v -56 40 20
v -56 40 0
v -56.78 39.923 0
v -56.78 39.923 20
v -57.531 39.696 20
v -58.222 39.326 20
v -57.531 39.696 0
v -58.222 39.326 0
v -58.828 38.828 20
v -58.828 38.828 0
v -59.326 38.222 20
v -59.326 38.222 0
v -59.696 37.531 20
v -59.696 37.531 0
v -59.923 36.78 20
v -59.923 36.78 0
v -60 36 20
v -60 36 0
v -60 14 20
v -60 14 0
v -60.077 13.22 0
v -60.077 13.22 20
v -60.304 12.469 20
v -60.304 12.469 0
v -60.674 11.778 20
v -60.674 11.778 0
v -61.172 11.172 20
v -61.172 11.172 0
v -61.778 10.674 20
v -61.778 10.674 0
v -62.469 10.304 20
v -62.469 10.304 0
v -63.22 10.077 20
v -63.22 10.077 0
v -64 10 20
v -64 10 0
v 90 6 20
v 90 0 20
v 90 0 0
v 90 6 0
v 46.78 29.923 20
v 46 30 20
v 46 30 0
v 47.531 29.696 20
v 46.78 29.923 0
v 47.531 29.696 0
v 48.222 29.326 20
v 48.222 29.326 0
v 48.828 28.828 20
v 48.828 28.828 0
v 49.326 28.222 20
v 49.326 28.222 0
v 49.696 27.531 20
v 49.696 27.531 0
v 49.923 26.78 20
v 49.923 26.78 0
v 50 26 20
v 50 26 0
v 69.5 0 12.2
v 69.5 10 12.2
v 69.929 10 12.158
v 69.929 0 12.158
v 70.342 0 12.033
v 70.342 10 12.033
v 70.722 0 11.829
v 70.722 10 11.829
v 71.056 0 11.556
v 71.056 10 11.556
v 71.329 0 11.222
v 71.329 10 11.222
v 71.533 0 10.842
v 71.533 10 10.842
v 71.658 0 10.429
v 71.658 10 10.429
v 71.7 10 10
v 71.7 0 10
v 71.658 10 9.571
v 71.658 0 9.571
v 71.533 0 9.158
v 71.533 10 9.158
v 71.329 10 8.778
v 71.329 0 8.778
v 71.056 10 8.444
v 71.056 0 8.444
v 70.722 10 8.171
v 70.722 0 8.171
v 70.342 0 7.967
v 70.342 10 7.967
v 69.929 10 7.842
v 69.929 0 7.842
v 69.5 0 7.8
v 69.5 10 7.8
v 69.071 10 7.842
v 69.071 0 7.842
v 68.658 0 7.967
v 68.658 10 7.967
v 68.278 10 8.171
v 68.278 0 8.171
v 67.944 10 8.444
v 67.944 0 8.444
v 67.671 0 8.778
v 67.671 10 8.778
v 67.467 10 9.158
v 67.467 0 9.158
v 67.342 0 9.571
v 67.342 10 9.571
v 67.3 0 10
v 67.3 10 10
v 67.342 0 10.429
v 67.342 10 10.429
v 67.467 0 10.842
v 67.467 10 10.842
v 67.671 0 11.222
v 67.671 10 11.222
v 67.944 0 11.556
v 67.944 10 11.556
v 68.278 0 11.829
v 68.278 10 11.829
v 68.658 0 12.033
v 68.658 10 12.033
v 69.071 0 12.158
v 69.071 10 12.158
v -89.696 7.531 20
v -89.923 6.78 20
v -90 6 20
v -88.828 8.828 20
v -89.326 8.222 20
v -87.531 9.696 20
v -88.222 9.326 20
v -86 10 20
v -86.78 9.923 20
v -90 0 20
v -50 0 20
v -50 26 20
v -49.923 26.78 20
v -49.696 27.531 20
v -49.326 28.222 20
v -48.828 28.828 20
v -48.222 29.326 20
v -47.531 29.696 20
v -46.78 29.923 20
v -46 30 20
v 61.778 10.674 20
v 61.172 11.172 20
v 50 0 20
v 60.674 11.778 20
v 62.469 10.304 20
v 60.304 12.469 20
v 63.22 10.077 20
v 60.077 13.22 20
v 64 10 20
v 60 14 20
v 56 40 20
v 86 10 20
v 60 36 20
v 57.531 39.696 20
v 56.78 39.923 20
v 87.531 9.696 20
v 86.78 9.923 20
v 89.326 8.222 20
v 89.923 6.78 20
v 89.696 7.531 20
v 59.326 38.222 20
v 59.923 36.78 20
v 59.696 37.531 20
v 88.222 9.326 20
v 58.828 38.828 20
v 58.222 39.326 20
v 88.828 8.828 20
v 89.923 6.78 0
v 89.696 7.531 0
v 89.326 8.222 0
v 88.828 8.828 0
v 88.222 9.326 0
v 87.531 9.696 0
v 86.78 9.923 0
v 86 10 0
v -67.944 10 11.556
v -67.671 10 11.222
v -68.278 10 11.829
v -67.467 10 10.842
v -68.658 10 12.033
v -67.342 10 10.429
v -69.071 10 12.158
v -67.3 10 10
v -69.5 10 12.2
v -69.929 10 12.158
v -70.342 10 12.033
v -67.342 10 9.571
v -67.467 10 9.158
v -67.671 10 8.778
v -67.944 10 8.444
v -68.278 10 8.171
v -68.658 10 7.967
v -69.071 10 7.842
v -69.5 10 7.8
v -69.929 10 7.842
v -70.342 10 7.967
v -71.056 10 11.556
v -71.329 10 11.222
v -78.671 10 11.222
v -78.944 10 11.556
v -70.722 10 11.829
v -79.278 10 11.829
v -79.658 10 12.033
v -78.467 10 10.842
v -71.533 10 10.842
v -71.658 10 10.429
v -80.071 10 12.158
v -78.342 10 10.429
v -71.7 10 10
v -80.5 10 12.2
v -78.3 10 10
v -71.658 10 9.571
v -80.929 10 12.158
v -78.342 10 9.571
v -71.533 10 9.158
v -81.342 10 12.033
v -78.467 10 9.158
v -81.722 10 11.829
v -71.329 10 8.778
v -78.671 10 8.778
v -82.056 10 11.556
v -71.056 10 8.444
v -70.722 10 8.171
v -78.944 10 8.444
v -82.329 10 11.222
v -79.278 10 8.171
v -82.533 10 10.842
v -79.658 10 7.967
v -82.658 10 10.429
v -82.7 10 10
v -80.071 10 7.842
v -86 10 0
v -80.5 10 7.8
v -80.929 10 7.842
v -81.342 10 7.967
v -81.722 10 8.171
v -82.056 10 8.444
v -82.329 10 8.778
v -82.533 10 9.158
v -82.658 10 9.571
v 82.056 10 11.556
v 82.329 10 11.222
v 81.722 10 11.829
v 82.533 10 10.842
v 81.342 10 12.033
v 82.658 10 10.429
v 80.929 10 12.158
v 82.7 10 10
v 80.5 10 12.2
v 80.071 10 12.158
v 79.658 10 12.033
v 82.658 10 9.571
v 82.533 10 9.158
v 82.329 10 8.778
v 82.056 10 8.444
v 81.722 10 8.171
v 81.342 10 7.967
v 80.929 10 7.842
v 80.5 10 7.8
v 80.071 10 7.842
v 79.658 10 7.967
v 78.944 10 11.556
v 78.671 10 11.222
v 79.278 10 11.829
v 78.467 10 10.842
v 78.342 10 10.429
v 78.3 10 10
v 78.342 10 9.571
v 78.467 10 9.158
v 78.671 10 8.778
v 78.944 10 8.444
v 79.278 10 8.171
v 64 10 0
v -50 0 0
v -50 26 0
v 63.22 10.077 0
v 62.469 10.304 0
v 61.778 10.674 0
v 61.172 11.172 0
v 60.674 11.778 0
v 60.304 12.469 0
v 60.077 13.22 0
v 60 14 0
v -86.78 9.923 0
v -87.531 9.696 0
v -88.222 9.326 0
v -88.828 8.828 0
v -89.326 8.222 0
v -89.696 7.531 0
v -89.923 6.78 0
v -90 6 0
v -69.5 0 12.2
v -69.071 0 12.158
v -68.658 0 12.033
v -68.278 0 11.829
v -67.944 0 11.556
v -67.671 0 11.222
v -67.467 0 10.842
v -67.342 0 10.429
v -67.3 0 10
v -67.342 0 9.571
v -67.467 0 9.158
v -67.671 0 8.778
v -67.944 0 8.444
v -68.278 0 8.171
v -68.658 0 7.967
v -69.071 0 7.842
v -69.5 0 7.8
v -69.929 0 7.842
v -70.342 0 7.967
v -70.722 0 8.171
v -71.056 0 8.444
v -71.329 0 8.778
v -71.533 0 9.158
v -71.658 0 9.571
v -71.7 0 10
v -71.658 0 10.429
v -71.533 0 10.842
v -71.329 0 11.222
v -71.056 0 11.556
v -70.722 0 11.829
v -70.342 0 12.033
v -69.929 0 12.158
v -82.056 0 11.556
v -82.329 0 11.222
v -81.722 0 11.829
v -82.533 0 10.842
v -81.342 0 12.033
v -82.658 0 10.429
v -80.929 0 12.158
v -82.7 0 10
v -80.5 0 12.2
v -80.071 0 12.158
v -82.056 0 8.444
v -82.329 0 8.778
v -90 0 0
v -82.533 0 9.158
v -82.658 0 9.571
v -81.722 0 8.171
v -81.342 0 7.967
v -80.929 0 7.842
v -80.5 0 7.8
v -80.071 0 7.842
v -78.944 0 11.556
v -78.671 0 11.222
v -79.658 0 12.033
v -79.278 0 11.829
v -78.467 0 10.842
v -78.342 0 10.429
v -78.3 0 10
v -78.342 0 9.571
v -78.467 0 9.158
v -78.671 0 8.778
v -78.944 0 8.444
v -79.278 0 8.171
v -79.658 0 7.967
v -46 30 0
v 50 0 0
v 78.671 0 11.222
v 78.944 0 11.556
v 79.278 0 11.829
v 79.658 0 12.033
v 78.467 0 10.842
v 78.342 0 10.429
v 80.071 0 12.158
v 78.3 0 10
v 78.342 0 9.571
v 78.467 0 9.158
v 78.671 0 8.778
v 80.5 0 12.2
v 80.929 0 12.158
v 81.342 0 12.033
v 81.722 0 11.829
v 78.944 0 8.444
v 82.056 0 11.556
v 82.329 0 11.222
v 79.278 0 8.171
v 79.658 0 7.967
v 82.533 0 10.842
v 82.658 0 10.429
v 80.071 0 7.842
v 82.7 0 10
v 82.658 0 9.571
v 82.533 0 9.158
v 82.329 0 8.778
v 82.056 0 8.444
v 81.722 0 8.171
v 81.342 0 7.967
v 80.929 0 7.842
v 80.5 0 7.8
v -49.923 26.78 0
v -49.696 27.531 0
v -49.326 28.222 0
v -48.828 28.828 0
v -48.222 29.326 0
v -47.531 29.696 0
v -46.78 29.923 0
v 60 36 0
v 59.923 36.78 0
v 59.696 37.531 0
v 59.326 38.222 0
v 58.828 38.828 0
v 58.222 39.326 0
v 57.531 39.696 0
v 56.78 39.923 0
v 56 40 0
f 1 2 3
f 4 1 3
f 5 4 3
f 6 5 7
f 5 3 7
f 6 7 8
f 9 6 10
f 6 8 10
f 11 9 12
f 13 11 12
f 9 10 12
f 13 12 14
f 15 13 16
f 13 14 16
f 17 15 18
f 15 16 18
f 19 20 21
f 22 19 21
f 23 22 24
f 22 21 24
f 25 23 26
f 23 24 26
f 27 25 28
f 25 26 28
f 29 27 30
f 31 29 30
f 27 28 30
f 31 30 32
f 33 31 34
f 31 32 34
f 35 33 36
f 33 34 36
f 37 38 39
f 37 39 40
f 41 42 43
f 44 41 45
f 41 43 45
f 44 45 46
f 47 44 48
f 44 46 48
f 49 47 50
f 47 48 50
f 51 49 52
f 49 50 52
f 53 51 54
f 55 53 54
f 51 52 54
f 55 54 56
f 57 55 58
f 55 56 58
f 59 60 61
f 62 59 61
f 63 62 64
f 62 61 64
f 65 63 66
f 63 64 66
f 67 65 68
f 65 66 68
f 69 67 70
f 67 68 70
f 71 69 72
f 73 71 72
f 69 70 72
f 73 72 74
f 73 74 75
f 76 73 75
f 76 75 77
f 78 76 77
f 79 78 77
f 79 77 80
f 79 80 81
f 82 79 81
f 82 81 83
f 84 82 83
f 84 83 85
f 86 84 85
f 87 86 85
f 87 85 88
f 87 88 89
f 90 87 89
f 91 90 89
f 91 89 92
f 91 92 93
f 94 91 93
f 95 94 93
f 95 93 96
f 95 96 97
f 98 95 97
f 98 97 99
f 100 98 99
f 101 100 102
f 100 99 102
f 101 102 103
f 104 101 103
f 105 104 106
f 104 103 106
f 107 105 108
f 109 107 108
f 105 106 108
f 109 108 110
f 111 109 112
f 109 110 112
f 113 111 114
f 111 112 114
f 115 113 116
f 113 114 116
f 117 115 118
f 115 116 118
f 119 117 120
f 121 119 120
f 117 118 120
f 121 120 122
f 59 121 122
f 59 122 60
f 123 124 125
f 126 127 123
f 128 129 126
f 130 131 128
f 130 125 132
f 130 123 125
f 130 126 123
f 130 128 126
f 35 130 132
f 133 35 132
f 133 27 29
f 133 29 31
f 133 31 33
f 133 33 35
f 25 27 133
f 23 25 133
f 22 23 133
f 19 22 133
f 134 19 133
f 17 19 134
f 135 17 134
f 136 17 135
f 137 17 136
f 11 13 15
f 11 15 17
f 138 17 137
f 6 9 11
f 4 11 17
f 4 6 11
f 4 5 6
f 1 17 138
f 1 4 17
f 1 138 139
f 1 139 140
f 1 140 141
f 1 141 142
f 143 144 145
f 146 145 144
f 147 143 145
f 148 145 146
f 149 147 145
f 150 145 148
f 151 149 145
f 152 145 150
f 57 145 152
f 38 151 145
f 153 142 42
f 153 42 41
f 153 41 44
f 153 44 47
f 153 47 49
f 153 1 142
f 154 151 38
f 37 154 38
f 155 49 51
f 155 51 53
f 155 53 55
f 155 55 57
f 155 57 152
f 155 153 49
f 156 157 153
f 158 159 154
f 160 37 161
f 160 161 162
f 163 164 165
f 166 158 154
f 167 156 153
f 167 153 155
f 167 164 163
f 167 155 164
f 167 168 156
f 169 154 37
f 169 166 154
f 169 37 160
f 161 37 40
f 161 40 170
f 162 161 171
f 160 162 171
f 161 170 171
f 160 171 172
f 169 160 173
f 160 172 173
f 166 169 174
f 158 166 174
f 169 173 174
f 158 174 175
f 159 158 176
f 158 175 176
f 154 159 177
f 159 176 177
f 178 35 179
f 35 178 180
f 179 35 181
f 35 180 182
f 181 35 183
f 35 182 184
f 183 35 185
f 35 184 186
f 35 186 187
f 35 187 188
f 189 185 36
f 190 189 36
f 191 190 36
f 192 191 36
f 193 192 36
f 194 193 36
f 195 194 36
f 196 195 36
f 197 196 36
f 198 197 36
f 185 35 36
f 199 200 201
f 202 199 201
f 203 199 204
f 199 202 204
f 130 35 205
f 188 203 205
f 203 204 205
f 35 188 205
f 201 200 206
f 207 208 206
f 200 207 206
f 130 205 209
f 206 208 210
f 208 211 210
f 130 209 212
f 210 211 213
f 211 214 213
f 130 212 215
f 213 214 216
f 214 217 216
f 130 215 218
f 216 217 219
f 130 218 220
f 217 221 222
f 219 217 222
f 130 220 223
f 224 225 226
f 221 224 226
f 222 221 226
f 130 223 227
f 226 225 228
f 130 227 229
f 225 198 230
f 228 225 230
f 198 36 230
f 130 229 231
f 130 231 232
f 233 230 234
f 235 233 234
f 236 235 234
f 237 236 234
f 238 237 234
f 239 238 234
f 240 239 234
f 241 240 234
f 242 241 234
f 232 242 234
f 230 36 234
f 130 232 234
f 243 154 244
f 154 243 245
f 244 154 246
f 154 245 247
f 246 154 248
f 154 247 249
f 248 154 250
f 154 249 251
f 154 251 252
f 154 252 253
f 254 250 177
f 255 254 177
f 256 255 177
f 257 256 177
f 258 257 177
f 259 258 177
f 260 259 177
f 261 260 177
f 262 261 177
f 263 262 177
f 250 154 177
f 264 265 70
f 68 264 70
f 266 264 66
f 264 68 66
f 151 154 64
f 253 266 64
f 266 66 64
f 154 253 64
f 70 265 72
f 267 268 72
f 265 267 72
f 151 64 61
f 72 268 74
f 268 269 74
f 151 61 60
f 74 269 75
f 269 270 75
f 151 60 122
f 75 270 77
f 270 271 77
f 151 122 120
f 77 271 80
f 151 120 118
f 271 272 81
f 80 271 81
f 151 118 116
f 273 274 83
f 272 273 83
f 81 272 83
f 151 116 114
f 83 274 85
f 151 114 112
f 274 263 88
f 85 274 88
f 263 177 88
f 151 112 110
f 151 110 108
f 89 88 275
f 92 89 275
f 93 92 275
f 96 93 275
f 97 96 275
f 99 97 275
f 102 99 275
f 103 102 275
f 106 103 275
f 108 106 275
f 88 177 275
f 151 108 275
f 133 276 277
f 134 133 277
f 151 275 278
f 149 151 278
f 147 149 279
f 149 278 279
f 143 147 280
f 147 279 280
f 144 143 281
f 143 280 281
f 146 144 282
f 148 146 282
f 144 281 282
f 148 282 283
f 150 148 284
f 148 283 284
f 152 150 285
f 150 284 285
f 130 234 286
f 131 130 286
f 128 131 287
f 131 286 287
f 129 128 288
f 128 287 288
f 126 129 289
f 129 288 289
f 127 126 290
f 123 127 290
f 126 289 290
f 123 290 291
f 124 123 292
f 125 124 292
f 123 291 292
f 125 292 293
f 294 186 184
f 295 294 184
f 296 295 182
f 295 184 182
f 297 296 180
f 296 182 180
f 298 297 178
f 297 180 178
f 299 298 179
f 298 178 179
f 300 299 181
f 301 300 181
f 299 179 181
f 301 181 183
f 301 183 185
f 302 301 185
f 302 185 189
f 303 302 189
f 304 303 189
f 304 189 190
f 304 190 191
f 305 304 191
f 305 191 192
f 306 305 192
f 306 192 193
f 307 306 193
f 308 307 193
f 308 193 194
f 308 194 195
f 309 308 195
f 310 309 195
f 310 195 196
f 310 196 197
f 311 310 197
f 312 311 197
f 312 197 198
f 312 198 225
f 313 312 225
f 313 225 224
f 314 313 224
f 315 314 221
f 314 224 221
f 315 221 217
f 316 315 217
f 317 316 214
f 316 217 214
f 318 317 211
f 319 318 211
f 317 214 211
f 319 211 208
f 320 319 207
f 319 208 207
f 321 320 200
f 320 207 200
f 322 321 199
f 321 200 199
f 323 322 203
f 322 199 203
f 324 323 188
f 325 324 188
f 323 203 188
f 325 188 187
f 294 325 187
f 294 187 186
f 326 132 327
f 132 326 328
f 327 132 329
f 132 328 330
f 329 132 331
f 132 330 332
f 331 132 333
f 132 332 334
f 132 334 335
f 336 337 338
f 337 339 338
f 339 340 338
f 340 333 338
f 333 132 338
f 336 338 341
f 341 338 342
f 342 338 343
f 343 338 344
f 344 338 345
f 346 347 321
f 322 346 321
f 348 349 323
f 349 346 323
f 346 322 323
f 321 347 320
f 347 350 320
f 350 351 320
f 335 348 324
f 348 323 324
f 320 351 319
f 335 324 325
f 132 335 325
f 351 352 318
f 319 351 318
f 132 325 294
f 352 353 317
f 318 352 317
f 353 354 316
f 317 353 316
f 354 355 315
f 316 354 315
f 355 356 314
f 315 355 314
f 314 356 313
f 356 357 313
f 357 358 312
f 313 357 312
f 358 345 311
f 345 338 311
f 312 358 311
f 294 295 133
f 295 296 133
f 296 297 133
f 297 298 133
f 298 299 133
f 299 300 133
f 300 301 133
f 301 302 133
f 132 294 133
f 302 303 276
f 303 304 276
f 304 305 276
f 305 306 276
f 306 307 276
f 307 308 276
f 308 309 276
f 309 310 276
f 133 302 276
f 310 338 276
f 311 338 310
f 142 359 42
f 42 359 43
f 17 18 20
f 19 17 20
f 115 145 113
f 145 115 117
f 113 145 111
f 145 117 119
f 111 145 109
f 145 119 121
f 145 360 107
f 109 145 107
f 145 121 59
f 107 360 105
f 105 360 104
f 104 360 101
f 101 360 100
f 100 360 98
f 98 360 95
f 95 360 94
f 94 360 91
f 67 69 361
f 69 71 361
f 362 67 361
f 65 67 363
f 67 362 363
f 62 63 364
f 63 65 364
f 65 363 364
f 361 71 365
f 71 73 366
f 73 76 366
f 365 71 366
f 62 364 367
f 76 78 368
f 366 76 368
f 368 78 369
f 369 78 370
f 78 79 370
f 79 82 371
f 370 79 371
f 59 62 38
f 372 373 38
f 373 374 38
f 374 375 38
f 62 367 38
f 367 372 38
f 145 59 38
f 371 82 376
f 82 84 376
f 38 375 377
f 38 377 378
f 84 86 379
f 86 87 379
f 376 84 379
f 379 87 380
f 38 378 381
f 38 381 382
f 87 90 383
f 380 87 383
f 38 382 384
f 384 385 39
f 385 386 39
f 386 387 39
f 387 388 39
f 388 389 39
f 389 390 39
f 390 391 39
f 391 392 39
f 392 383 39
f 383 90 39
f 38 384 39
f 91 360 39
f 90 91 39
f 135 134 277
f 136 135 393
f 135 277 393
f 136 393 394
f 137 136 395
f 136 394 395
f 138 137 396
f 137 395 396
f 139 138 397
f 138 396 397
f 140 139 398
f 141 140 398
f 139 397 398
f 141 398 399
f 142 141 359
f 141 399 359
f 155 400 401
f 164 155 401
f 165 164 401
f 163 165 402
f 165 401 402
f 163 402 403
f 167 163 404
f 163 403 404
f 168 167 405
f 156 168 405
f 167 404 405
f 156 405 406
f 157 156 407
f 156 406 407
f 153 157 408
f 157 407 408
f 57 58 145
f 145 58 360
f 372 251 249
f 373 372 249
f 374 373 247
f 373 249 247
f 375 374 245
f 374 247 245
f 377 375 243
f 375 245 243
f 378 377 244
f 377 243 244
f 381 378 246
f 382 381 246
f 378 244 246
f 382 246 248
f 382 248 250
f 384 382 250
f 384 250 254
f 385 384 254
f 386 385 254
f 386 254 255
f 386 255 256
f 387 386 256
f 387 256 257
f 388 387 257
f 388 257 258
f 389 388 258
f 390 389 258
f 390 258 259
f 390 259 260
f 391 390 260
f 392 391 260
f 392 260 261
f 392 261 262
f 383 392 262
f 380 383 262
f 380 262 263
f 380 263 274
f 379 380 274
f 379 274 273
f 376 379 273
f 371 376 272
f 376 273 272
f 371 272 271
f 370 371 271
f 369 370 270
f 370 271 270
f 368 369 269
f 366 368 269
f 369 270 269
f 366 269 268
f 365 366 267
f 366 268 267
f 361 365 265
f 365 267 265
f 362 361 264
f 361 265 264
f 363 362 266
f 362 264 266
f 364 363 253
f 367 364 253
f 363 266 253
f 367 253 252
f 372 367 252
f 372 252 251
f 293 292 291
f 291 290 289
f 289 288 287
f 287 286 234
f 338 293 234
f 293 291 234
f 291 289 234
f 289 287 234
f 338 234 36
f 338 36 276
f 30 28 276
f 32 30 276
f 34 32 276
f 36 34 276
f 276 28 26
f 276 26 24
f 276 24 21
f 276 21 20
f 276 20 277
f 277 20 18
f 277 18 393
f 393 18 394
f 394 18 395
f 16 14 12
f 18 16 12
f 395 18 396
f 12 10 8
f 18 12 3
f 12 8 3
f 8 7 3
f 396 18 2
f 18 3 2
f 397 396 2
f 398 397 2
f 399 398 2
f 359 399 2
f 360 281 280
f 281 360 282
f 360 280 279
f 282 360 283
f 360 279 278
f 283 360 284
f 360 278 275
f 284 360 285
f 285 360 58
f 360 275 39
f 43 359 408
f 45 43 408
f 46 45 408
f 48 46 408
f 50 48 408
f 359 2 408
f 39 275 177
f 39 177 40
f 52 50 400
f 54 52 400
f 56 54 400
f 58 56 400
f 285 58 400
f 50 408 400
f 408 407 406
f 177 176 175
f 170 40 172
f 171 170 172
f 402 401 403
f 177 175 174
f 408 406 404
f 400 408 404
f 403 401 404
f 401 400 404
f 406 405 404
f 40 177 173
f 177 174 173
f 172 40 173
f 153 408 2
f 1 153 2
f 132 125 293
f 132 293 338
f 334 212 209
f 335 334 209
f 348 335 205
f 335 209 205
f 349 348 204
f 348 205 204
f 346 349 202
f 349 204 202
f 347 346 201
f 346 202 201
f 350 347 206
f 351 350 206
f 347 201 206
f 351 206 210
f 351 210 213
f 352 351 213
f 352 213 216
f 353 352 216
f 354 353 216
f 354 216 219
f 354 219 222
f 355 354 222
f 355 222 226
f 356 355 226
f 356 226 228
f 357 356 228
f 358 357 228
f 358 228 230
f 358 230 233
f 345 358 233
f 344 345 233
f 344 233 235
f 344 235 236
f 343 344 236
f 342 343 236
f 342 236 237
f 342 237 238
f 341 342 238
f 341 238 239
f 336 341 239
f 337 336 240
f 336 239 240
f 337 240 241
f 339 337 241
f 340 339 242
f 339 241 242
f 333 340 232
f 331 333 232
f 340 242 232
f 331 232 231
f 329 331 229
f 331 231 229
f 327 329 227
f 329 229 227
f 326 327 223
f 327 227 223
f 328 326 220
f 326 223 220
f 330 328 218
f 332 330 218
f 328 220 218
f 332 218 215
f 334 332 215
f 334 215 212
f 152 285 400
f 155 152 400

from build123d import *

# Parameters (mm, degrees)
EXTRUDE_1_DEPTH     = 20
SKETCH_2_R          = 2.2
CUT_EXTRUDE_1_DEPTH = 20


with BuildPart() as part:
    # 草图1 → 凸台-拉伸1 (new body)
    with BuildSketch(Plane.XY):
        with BuildLine():
            Line((-46, 30), (46, 30))
            ThreePointArc((46, 30), (48.828427125, 28.828427125), (50, 26))
            Line((50, 26), (50, 0))
            Line((50, 0), (90, 0))
            Line((90, 0), (90, 6))
            ThreePointArc((90, 6), (88.828427125, 8.828427125), (86, 10))
            Line((86, 10), (64, 10))
            ThreePointArc((64, 10), (61.171572875, 11.171572875), (60, 14))
            Line((60, 14), (60, 36))
            ThreePointArc((60, 36), (58.828427125, 38.828427125), (56, 40))
            Line((56, 40), (-56, 40))
            ThreePointArc((-56, 40), (-58.828427125, 38.828427125), (-60, 36))
            Line((-60, 36), (-60, 14))
            ThreePointArc((-60, 14), (-61.171572875, 11.171572875), (-64, 10))
            Line((-64, 10), (-86, 10))
            ThreePointArc((-86, 10), (-88.828427125, 8.828427125), (-90, 6))
            Line((-90, 6), (-90, 0))
            Line((-90, 0), (-50, 0))
            Line((-50, 0), (-50, 26))
            ThreePointArc((-50, 26), (-48.828427125, 28.828427125), (-46, 30))
        make_face()
    extrude(amount=EXTRUDE_1_DEPTH)

    # 草图2 → 切除-拉伸1 (cut)
    with BuildSketch(Plane(origin=(0, 10, 0), x_dir=(1, 0, 0), z_dir=(0, 1, 0))):
        with Locations(Location((-80.5, -10, 0), (0, 0, 270))):
            Circle(SKETCH_2_R)
        with Locations(Location((-69.5, -10, 0), (0, 0, 270))):
            Circle(SKETCH_2_R)
        with Locations(Location((69.5, -10, 0), (0, 0, 270))):
            Circle(SKETCH_2_R)
        with Locations(Location((80.5, -10, 0), (0, 0, 270))):
            Circle(SKETCH_2_R)
    extrude(amount=-CUT_EXTRUDE_1_DEPTH, mode=Mode.SUBTRACT)


solid = part.part
